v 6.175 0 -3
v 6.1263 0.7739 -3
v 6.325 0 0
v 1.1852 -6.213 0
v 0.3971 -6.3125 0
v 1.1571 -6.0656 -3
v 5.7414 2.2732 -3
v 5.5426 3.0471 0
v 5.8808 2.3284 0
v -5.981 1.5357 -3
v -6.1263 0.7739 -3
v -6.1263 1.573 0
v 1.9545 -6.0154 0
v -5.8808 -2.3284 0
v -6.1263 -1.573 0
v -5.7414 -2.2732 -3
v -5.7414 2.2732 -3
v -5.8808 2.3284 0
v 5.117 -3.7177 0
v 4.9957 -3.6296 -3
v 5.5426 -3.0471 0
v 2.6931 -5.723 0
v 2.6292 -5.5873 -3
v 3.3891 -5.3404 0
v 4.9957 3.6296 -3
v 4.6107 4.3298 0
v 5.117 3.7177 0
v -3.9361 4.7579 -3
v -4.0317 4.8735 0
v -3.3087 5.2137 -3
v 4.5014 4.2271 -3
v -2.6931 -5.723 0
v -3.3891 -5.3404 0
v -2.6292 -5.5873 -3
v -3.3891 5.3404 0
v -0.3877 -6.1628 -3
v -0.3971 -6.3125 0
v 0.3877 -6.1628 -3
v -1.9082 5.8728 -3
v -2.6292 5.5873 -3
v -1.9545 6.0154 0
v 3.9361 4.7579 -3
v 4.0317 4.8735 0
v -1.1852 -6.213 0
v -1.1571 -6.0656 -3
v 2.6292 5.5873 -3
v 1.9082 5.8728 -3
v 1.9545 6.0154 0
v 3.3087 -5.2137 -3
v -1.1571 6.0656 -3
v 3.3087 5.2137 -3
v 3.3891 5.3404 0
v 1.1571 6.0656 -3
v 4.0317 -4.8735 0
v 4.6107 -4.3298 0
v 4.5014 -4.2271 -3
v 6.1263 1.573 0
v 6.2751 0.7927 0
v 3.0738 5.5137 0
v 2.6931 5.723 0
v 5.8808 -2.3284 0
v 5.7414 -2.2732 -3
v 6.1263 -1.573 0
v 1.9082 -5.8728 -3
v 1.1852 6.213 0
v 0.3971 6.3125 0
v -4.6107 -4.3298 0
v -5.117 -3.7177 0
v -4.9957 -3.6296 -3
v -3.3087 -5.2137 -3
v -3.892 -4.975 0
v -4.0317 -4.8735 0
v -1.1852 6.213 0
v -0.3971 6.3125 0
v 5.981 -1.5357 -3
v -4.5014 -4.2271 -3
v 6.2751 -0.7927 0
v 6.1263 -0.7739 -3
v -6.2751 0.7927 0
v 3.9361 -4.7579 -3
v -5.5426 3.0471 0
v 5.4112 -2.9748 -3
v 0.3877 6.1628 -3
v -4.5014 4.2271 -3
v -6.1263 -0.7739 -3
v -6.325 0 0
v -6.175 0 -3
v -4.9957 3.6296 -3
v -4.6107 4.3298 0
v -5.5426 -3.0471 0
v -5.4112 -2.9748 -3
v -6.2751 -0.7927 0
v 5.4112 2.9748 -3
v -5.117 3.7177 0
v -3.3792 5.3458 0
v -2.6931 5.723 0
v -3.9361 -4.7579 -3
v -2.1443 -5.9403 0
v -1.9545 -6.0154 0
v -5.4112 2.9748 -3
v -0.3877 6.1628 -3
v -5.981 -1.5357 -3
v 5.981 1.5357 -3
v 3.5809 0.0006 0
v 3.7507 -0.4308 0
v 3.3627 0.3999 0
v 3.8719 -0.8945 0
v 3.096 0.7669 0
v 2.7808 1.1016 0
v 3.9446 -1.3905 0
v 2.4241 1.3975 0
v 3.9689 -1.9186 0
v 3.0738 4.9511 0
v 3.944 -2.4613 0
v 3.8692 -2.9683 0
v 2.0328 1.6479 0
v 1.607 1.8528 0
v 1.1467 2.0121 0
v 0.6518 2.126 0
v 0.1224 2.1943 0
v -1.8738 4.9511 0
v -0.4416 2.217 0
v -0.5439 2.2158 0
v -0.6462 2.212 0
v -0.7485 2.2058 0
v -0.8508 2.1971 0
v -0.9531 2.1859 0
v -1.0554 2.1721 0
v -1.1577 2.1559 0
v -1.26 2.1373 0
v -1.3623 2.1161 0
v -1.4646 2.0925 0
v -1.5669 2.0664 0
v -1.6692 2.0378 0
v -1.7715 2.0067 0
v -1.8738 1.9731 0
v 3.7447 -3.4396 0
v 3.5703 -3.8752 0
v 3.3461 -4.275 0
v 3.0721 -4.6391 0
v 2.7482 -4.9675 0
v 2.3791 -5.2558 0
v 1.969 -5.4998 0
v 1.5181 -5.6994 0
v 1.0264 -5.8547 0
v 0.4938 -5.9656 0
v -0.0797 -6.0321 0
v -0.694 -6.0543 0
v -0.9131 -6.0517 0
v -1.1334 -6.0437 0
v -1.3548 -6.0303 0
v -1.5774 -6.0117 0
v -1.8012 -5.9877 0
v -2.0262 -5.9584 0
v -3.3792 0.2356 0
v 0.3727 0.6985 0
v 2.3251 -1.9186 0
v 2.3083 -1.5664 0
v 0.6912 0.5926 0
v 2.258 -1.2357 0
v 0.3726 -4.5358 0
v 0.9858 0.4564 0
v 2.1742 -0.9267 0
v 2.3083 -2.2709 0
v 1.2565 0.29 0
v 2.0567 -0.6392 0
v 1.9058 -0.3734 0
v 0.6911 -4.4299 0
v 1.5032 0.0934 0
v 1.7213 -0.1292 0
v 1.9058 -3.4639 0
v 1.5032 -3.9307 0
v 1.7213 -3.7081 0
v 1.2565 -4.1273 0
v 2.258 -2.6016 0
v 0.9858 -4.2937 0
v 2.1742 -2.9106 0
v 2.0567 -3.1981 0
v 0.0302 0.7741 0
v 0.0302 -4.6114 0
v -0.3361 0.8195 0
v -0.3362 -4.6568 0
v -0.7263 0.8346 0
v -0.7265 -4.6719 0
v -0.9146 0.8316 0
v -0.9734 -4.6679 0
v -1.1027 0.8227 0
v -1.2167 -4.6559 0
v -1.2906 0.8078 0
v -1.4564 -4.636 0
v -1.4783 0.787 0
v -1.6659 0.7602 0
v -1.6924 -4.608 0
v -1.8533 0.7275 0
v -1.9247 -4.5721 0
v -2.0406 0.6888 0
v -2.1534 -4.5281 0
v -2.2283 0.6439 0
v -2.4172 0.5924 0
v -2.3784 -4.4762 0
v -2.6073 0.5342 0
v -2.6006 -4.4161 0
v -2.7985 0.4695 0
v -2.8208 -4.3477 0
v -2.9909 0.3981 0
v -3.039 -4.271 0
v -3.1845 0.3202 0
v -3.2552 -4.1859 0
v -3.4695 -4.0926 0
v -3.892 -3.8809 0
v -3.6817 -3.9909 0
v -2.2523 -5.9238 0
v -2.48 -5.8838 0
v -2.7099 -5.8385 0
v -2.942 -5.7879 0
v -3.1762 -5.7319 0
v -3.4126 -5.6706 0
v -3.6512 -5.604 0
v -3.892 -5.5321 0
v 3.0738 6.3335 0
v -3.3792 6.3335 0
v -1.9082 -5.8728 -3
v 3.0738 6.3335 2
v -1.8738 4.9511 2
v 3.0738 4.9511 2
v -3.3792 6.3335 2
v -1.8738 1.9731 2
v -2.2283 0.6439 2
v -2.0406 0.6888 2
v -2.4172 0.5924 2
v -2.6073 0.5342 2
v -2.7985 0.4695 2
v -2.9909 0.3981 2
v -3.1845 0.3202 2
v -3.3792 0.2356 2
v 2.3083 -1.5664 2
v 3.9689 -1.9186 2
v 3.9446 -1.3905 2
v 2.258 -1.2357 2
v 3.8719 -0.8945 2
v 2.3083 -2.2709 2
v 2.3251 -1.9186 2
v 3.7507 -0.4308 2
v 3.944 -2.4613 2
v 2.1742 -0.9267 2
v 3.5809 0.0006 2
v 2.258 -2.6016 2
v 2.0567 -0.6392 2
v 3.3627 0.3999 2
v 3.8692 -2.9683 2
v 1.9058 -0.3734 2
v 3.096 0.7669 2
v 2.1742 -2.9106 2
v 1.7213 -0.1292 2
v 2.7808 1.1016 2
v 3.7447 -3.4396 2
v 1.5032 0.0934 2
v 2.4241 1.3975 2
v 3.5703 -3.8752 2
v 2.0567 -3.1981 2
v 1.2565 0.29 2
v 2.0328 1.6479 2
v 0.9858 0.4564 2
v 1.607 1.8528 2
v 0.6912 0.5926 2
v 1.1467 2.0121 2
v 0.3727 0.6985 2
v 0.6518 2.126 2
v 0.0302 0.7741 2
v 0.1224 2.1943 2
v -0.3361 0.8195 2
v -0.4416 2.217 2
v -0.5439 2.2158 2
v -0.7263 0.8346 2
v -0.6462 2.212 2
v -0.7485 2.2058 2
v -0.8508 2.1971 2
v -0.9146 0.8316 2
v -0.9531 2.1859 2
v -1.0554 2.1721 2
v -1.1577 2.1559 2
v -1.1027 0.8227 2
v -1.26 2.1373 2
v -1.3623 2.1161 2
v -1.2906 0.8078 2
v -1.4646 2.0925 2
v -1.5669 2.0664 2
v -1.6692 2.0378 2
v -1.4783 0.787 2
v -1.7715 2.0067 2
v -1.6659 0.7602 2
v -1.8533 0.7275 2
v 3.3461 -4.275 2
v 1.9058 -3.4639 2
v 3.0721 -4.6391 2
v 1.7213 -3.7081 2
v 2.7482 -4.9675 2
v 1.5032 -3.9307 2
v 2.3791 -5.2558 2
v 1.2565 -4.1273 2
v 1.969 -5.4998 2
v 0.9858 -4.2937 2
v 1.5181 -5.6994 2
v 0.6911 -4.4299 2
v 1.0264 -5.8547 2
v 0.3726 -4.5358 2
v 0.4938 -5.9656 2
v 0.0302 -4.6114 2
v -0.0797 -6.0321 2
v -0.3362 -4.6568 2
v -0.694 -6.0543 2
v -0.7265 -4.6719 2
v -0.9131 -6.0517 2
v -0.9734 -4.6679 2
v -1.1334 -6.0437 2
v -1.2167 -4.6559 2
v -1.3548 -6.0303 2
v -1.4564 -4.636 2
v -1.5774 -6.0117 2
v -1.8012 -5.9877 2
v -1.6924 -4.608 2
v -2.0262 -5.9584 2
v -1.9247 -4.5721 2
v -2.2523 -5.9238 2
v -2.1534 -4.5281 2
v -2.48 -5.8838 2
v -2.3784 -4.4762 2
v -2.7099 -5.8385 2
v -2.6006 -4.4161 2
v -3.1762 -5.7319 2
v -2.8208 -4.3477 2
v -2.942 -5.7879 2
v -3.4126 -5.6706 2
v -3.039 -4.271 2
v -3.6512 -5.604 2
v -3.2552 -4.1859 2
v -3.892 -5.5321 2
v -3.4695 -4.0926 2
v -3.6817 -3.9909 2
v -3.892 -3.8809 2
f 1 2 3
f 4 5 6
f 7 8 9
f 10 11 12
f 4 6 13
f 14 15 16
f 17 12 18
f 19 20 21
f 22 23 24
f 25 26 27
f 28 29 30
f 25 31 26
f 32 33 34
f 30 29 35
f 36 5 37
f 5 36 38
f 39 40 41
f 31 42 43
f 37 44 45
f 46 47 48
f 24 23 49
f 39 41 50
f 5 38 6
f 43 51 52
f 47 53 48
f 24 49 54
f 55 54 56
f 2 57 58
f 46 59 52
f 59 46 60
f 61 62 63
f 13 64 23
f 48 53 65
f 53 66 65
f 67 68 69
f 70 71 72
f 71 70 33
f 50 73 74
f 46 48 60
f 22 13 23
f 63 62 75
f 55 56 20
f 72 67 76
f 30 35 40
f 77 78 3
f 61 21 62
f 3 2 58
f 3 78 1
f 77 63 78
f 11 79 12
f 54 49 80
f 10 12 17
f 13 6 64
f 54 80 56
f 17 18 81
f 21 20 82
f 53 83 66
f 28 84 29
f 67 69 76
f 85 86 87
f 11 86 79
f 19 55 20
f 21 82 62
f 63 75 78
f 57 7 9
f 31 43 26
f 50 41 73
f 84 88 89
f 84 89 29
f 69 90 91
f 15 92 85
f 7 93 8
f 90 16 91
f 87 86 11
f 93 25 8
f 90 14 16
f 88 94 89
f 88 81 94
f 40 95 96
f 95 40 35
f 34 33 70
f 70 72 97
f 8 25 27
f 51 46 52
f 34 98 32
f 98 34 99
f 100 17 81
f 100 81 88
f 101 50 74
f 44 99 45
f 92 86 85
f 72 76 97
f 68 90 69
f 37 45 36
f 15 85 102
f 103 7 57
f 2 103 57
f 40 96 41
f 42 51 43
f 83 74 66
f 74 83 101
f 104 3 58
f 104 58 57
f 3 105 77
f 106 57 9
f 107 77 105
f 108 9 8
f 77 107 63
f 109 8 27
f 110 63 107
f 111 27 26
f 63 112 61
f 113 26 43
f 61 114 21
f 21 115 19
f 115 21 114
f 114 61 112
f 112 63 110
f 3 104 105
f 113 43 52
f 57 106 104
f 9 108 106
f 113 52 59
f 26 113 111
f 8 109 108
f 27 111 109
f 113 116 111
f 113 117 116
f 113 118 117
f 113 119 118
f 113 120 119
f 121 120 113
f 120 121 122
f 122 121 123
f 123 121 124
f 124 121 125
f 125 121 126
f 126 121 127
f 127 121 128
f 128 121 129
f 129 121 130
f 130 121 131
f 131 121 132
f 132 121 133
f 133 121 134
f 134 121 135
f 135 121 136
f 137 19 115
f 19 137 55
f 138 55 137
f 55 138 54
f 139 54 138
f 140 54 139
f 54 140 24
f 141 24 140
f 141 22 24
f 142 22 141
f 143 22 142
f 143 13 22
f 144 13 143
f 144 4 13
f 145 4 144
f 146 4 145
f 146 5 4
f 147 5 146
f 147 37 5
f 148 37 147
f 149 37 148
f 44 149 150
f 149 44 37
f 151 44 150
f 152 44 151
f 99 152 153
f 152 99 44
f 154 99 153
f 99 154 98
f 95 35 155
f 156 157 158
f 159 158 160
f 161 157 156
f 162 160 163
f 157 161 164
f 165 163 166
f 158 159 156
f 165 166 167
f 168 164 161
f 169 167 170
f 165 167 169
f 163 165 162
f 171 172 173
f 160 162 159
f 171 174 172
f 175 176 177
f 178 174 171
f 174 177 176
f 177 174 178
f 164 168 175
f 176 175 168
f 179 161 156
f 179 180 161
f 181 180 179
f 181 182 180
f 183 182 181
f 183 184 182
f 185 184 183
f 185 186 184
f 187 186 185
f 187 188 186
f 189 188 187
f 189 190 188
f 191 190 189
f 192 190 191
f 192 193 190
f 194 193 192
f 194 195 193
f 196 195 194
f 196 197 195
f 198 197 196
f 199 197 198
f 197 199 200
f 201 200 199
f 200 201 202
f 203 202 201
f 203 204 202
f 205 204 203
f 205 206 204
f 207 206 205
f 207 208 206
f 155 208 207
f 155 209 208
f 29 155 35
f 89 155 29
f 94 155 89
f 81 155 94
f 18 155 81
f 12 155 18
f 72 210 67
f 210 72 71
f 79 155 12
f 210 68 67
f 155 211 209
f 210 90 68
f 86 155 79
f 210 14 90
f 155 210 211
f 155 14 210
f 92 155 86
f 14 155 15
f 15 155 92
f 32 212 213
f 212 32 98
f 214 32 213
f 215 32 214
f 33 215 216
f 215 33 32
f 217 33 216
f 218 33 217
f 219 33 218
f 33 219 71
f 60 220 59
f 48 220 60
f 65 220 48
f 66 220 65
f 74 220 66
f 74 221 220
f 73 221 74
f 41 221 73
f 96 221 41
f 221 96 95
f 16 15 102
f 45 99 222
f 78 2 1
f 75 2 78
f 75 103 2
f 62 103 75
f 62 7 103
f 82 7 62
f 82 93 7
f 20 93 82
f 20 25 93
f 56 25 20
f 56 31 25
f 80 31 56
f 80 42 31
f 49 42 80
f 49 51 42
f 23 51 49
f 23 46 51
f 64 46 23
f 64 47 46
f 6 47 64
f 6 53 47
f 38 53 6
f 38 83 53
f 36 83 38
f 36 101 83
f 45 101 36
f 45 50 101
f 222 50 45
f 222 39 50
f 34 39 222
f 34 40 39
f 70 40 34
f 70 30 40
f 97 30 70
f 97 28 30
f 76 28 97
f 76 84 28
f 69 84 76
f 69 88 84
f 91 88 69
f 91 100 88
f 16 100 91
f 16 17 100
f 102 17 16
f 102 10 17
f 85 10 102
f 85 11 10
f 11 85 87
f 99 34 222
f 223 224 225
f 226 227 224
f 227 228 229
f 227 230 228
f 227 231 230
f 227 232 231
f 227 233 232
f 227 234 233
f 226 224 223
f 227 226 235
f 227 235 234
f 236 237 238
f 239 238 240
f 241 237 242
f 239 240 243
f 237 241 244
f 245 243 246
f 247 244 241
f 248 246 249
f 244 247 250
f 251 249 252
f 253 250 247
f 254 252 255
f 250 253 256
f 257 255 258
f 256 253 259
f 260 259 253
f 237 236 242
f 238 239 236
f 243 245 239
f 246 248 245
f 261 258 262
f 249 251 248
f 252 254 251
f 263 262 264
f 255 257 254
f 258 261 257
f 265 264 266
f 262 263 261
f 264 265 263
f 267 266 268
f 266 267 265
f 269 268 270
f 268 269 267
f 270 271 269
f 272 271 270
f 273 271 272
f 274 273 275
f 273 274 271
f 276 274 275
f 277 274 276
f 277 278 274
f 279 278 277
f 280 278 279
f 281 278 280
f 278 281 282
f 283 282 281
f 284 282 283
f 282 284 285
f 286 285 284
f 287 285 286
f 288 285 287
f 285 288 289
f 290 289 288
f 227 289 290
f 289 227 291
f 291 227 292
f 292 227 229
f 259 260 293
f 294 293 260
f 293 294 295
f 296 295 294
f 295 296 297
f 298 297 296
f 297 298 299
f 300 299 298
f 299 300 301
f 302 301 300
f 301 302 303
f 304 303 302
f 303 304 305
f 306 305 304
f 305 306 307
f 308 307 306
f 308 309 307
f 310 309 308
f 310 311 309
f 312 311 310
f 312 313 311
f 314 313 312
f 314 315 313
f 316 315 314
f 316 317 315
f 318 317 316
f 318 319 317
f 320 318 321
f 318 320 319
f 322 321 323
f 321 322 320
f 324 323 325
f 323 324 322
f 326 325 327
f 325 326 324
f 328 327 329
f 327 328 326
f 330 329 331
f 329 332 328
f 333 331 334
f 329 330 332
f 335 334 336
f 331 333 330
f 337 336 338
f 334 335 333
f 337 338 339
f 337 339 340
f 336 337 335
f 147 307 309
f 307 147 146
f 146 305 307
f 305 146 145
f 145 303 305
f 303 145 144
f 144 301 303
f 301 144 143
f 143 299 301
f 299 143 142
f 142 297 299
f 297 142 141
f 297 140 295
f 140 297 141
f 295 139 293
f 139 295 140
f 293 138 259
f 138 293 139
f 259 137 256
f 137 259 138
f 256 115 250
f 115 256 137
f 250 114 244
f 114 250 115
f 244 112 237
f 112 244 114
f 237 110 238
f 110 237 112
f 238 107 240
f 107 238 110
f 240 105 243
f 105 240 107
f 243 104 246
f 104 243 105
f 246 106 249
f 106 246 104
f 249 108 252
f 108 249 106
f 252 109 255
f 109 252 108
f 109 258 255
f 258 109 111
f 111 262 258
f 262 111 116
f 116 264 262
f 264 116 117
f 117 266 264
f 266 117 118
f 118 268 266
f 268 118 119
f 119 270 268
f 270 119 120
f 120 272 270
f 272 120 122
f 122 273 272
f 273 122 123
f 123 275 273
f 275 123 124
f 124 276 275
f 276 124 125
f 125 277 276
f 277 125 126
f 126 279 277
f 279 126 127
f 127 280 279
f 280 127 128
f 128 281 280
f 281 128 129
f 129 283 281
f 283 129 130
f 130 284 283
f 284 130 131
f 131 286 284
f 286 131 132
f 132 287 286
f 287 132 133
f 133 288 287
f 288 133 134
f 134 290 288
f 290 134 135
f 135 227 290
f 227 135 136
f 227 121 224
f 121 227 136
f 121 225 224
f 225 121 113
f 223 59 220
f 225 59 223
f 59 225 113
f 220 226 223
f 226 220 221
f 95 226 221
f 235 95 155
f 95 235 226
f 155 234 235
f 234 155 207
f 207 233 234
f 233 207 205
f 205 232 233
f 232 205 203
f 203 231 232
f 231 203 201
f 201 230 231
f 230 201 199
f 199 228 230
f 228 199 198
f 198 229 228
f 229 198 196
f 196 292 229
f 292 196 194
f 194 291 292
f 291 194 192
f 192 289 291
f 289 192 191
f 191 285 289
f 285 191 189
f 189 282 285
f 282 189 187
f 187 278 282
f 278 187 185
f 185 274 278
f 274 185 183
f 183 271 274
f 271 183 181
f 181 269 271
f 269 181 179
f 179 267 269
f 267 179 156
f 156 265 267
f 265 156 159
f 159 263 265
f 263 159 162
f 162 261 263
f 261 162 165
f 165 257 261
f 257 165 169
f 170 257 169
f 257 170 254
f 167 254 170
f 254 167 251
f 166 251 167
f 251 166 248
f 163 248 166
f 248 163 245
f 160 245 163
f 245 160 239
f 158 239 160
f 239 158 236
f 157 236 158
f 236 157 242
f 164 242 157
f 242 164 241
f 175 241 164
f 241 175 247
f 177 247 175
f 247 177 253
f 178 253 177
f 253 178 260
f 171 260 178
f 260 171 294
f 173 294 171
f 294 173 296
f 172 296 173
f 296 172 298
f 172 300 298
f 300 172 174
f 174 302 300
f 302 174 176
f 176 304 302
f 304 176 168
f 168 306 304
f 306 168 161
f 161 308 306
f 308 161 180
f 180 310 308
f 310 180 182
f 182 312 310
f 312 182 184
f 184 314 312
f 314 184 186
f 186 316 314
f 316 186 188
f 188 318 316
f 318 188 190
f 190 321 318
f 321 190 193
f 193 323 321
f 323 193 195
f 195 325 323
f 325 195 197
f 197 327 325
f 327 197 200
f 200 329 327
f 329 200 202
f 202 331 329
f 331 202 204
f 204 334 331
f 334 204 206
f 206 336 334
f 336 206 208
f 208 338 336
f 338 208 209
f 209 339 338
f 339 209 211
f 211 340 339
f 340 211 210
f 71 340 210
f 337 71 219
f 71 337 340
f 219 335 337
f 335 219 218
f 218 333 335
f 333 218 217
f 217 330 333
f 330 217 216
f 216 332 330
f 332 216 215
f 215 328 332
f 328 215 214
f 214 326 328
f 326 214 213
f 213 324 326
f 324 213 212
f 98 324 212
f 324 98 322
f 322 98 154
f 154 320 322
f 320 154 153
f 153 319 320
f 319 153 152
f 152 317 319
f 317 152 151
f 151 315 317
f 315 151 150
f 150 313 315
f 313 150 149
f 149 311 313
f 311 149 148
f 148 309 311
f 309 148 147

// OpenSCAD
$fn = 50;


difference() {
	union() {
		translate(v = [0, 0, -3.0000000000]) {
			cylinder(h = 3, r1 = 6.1750000000, r2 = 6.3250000000);
		}
		linear_extrude(height = 2) {
			text(font = "Impact", halign = "center", size = 12, text = "5", valign = "center");
		}
	}
	union();
}
